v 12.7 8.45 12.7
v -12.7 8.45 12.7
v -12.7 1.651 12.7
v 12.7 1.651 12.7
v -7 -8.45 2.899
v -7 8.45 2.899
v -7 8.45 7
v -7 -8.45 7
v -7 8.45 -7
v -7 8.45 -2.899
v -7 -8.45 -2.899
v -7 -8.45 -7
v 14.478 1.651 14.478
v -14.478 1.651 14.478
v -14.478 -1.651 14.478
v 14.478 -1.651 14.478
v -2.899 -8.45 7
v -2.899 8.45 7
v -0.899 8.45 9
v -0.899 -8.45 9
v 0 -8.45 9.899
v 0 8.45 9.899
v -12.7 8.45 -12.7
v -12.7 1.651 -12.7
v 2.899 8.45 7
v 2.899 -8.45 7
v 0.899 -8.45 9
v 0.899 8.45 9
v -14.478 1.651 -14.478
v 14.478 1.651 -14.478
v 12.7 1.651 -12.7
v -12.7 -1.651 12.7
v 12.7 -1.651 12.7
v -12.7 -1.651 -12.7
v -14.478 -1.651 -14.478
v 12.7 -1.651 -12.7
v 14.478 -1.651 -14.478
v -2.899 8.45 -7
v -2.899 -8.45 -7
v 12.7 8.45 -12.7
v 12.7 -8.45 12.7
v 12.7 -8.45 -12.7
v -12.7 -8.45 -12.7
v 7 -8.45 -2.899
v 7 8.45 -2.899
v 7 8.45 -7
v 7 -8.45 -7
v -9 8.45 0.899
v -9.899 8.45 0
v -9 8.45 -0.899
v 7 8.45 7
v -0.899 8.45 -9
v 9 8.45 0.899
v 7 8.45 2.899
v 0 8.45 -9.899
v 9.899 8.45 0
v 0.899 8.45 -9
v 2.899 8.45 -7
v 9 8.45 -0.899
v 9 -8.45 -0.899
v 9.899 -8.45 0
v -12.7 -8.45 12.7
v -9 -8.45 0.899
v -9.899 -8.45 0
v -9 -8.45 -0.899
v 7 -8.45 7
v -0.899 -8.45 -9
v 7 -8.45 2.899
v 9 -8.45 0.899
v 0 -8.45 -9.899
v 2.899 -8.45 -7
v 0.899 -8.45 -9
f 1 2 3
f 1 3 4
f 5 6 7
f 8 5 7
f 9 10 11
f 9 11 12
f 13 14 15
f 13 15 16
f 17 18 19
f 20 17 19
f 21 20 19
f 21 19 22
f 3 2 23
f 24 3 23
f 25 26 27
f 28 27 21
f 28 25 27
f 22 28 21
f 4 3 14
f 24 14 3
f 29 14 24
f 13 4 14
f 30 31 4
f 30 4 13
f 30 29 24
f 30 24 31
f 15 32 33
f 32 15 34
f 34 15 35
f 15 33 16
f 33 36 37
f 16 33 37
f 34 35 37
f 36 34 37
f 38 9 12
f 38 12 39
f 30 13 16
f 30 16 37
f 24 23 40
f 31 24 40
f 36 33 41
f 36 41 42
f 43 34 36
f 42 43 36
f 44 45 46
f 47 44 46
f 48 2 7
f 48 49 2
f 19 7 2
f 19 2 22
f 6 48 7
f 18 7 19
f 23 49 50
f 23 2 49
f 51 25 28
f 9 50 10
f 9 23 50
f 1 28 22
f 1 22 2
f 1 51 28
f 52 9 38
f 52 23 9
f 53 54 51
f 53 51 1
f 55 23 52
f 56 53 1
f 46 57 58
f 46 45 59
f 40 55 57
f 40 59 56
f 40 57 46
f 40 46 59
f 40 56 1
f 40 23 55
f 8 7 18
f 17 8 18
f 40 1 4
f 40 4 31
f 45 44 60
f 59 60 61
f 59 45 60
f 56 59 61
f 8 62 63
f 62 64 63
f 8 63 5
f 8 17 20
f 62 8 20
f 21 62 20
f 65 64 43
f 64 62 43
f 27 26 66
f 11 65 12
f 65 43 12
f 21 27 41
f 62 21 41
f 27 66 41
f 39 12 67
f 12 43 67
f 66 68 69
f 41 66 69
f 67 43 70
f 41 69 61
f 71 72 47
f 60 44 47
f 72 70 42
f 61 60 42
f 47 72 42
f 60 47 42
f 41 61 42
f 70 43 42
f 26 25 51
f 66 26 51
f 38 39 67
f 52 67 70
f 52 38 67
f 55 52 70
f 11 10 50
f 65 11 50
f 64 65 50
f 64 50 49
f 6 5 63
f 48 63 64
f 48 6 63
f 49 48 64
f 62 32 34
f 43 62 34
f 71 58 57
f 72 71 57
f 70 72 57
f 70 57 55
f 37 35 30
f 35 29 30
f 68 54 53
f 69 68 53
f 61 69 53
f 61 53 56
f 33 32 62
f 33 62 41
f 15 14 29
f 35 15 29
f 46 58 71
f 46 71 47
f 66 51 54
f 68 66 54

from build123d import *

# Parameters (mm, degrees)
SKETCH1_W           = 25.4
SKETCH1_H           = 25.4
BOSS_EXTRUDE1_DEPTH = 8.45
SKETCH2_W           = 28.956
SKETCH2_H           = 28.956
BOSS_EXTRUDE2_DEPTH = 1.651
CUT_EXTRUDE1_DEPTH  = 27.54872818
CIRPATTERN1_COUNT   = 2
CIRPATTERN1_ANGLE   = 45
SKETCH4_W           = 14
SKETCH4_H           = 14
CUT_EXTRUDE2_DEPTH  = 27.54872818


with BuildPart() as part:
    # Sketch1 → Boss-Extrude1 (new, symmetric)
    with BuildSketch(Plane(origin=(0, 0, 0), x_dir=(1, 0, 0), z_dir=(0, 1, 0))):
        Rectangle(SKETCH1_W, SKETCH1_H)
    extrude(amount=BOSS_EXTRUDE1_DEPTH, both=True)

    # Sketch2 → Boss-Extrude2 (add, symmetric)
    with BuildSketch(Plane(origin=(0, 0, 0), x_dir=(1, 0, 0), z_dir=(0, 1, 0))):
        Rectangle(SKETCH2_W, SKETCH2_H)
    extrude(amount=BOSS_EXTRUDE2_DEPTH, both=True)

    # Sketch3 → Cut-Extrude1 (cut, through all)
    with BuildSketch(Plane(origin=(0, 8.45, 0), x_dir=(1, 0, 0), z_dir=(0, 1, 0))):
        Polygon((-5.727922061, 7), (-7, 5.727922061), (-7, -5.727922061), (-5.727922061, -7), (5.727922061, -7), (7, -5.727922061), (7, 5.727922061), (5.727922061, 7), align=None)
    cut_extrude1 = extrude(amount=-CUT_EXTRUDE1_DEPTH, mode=Mode.SUBTRACT)

    # CirPattern1: Cut-Extrude1 ×2 about axis
    cirpattern1_axis = Axis((0, 50, 0), (0, -1, 0))
    for i in range(1, CIRPATTERN1_COUNT):
        add(cut_extrude1.rotate(cirpattern1_axis, i * CIRPATTERN1_ANGLE / (CIRPATTERN1_COUNT - 1)), mode=Mode.SUBTRACT)

    # Sketch4 → Cut-Extrude2 (cut, through all)
    with BuildSketch(Plane(origin=(0, 8.45, 0), x_dir=(1, 0, 0), z_dir=(0, 1, 0))):
        Rectangle(SKETCH4_W, SKETCH4_H)
        Polygon((0, -9.899494937), (-9.899494937, 0), (0, 9.899494937), (9.899494937, 0), align=None)
    extrude(amount=-CUT_EXTRUDE2_DEPTH, mode=Mode.SUBTRACT)


solid = part.part
